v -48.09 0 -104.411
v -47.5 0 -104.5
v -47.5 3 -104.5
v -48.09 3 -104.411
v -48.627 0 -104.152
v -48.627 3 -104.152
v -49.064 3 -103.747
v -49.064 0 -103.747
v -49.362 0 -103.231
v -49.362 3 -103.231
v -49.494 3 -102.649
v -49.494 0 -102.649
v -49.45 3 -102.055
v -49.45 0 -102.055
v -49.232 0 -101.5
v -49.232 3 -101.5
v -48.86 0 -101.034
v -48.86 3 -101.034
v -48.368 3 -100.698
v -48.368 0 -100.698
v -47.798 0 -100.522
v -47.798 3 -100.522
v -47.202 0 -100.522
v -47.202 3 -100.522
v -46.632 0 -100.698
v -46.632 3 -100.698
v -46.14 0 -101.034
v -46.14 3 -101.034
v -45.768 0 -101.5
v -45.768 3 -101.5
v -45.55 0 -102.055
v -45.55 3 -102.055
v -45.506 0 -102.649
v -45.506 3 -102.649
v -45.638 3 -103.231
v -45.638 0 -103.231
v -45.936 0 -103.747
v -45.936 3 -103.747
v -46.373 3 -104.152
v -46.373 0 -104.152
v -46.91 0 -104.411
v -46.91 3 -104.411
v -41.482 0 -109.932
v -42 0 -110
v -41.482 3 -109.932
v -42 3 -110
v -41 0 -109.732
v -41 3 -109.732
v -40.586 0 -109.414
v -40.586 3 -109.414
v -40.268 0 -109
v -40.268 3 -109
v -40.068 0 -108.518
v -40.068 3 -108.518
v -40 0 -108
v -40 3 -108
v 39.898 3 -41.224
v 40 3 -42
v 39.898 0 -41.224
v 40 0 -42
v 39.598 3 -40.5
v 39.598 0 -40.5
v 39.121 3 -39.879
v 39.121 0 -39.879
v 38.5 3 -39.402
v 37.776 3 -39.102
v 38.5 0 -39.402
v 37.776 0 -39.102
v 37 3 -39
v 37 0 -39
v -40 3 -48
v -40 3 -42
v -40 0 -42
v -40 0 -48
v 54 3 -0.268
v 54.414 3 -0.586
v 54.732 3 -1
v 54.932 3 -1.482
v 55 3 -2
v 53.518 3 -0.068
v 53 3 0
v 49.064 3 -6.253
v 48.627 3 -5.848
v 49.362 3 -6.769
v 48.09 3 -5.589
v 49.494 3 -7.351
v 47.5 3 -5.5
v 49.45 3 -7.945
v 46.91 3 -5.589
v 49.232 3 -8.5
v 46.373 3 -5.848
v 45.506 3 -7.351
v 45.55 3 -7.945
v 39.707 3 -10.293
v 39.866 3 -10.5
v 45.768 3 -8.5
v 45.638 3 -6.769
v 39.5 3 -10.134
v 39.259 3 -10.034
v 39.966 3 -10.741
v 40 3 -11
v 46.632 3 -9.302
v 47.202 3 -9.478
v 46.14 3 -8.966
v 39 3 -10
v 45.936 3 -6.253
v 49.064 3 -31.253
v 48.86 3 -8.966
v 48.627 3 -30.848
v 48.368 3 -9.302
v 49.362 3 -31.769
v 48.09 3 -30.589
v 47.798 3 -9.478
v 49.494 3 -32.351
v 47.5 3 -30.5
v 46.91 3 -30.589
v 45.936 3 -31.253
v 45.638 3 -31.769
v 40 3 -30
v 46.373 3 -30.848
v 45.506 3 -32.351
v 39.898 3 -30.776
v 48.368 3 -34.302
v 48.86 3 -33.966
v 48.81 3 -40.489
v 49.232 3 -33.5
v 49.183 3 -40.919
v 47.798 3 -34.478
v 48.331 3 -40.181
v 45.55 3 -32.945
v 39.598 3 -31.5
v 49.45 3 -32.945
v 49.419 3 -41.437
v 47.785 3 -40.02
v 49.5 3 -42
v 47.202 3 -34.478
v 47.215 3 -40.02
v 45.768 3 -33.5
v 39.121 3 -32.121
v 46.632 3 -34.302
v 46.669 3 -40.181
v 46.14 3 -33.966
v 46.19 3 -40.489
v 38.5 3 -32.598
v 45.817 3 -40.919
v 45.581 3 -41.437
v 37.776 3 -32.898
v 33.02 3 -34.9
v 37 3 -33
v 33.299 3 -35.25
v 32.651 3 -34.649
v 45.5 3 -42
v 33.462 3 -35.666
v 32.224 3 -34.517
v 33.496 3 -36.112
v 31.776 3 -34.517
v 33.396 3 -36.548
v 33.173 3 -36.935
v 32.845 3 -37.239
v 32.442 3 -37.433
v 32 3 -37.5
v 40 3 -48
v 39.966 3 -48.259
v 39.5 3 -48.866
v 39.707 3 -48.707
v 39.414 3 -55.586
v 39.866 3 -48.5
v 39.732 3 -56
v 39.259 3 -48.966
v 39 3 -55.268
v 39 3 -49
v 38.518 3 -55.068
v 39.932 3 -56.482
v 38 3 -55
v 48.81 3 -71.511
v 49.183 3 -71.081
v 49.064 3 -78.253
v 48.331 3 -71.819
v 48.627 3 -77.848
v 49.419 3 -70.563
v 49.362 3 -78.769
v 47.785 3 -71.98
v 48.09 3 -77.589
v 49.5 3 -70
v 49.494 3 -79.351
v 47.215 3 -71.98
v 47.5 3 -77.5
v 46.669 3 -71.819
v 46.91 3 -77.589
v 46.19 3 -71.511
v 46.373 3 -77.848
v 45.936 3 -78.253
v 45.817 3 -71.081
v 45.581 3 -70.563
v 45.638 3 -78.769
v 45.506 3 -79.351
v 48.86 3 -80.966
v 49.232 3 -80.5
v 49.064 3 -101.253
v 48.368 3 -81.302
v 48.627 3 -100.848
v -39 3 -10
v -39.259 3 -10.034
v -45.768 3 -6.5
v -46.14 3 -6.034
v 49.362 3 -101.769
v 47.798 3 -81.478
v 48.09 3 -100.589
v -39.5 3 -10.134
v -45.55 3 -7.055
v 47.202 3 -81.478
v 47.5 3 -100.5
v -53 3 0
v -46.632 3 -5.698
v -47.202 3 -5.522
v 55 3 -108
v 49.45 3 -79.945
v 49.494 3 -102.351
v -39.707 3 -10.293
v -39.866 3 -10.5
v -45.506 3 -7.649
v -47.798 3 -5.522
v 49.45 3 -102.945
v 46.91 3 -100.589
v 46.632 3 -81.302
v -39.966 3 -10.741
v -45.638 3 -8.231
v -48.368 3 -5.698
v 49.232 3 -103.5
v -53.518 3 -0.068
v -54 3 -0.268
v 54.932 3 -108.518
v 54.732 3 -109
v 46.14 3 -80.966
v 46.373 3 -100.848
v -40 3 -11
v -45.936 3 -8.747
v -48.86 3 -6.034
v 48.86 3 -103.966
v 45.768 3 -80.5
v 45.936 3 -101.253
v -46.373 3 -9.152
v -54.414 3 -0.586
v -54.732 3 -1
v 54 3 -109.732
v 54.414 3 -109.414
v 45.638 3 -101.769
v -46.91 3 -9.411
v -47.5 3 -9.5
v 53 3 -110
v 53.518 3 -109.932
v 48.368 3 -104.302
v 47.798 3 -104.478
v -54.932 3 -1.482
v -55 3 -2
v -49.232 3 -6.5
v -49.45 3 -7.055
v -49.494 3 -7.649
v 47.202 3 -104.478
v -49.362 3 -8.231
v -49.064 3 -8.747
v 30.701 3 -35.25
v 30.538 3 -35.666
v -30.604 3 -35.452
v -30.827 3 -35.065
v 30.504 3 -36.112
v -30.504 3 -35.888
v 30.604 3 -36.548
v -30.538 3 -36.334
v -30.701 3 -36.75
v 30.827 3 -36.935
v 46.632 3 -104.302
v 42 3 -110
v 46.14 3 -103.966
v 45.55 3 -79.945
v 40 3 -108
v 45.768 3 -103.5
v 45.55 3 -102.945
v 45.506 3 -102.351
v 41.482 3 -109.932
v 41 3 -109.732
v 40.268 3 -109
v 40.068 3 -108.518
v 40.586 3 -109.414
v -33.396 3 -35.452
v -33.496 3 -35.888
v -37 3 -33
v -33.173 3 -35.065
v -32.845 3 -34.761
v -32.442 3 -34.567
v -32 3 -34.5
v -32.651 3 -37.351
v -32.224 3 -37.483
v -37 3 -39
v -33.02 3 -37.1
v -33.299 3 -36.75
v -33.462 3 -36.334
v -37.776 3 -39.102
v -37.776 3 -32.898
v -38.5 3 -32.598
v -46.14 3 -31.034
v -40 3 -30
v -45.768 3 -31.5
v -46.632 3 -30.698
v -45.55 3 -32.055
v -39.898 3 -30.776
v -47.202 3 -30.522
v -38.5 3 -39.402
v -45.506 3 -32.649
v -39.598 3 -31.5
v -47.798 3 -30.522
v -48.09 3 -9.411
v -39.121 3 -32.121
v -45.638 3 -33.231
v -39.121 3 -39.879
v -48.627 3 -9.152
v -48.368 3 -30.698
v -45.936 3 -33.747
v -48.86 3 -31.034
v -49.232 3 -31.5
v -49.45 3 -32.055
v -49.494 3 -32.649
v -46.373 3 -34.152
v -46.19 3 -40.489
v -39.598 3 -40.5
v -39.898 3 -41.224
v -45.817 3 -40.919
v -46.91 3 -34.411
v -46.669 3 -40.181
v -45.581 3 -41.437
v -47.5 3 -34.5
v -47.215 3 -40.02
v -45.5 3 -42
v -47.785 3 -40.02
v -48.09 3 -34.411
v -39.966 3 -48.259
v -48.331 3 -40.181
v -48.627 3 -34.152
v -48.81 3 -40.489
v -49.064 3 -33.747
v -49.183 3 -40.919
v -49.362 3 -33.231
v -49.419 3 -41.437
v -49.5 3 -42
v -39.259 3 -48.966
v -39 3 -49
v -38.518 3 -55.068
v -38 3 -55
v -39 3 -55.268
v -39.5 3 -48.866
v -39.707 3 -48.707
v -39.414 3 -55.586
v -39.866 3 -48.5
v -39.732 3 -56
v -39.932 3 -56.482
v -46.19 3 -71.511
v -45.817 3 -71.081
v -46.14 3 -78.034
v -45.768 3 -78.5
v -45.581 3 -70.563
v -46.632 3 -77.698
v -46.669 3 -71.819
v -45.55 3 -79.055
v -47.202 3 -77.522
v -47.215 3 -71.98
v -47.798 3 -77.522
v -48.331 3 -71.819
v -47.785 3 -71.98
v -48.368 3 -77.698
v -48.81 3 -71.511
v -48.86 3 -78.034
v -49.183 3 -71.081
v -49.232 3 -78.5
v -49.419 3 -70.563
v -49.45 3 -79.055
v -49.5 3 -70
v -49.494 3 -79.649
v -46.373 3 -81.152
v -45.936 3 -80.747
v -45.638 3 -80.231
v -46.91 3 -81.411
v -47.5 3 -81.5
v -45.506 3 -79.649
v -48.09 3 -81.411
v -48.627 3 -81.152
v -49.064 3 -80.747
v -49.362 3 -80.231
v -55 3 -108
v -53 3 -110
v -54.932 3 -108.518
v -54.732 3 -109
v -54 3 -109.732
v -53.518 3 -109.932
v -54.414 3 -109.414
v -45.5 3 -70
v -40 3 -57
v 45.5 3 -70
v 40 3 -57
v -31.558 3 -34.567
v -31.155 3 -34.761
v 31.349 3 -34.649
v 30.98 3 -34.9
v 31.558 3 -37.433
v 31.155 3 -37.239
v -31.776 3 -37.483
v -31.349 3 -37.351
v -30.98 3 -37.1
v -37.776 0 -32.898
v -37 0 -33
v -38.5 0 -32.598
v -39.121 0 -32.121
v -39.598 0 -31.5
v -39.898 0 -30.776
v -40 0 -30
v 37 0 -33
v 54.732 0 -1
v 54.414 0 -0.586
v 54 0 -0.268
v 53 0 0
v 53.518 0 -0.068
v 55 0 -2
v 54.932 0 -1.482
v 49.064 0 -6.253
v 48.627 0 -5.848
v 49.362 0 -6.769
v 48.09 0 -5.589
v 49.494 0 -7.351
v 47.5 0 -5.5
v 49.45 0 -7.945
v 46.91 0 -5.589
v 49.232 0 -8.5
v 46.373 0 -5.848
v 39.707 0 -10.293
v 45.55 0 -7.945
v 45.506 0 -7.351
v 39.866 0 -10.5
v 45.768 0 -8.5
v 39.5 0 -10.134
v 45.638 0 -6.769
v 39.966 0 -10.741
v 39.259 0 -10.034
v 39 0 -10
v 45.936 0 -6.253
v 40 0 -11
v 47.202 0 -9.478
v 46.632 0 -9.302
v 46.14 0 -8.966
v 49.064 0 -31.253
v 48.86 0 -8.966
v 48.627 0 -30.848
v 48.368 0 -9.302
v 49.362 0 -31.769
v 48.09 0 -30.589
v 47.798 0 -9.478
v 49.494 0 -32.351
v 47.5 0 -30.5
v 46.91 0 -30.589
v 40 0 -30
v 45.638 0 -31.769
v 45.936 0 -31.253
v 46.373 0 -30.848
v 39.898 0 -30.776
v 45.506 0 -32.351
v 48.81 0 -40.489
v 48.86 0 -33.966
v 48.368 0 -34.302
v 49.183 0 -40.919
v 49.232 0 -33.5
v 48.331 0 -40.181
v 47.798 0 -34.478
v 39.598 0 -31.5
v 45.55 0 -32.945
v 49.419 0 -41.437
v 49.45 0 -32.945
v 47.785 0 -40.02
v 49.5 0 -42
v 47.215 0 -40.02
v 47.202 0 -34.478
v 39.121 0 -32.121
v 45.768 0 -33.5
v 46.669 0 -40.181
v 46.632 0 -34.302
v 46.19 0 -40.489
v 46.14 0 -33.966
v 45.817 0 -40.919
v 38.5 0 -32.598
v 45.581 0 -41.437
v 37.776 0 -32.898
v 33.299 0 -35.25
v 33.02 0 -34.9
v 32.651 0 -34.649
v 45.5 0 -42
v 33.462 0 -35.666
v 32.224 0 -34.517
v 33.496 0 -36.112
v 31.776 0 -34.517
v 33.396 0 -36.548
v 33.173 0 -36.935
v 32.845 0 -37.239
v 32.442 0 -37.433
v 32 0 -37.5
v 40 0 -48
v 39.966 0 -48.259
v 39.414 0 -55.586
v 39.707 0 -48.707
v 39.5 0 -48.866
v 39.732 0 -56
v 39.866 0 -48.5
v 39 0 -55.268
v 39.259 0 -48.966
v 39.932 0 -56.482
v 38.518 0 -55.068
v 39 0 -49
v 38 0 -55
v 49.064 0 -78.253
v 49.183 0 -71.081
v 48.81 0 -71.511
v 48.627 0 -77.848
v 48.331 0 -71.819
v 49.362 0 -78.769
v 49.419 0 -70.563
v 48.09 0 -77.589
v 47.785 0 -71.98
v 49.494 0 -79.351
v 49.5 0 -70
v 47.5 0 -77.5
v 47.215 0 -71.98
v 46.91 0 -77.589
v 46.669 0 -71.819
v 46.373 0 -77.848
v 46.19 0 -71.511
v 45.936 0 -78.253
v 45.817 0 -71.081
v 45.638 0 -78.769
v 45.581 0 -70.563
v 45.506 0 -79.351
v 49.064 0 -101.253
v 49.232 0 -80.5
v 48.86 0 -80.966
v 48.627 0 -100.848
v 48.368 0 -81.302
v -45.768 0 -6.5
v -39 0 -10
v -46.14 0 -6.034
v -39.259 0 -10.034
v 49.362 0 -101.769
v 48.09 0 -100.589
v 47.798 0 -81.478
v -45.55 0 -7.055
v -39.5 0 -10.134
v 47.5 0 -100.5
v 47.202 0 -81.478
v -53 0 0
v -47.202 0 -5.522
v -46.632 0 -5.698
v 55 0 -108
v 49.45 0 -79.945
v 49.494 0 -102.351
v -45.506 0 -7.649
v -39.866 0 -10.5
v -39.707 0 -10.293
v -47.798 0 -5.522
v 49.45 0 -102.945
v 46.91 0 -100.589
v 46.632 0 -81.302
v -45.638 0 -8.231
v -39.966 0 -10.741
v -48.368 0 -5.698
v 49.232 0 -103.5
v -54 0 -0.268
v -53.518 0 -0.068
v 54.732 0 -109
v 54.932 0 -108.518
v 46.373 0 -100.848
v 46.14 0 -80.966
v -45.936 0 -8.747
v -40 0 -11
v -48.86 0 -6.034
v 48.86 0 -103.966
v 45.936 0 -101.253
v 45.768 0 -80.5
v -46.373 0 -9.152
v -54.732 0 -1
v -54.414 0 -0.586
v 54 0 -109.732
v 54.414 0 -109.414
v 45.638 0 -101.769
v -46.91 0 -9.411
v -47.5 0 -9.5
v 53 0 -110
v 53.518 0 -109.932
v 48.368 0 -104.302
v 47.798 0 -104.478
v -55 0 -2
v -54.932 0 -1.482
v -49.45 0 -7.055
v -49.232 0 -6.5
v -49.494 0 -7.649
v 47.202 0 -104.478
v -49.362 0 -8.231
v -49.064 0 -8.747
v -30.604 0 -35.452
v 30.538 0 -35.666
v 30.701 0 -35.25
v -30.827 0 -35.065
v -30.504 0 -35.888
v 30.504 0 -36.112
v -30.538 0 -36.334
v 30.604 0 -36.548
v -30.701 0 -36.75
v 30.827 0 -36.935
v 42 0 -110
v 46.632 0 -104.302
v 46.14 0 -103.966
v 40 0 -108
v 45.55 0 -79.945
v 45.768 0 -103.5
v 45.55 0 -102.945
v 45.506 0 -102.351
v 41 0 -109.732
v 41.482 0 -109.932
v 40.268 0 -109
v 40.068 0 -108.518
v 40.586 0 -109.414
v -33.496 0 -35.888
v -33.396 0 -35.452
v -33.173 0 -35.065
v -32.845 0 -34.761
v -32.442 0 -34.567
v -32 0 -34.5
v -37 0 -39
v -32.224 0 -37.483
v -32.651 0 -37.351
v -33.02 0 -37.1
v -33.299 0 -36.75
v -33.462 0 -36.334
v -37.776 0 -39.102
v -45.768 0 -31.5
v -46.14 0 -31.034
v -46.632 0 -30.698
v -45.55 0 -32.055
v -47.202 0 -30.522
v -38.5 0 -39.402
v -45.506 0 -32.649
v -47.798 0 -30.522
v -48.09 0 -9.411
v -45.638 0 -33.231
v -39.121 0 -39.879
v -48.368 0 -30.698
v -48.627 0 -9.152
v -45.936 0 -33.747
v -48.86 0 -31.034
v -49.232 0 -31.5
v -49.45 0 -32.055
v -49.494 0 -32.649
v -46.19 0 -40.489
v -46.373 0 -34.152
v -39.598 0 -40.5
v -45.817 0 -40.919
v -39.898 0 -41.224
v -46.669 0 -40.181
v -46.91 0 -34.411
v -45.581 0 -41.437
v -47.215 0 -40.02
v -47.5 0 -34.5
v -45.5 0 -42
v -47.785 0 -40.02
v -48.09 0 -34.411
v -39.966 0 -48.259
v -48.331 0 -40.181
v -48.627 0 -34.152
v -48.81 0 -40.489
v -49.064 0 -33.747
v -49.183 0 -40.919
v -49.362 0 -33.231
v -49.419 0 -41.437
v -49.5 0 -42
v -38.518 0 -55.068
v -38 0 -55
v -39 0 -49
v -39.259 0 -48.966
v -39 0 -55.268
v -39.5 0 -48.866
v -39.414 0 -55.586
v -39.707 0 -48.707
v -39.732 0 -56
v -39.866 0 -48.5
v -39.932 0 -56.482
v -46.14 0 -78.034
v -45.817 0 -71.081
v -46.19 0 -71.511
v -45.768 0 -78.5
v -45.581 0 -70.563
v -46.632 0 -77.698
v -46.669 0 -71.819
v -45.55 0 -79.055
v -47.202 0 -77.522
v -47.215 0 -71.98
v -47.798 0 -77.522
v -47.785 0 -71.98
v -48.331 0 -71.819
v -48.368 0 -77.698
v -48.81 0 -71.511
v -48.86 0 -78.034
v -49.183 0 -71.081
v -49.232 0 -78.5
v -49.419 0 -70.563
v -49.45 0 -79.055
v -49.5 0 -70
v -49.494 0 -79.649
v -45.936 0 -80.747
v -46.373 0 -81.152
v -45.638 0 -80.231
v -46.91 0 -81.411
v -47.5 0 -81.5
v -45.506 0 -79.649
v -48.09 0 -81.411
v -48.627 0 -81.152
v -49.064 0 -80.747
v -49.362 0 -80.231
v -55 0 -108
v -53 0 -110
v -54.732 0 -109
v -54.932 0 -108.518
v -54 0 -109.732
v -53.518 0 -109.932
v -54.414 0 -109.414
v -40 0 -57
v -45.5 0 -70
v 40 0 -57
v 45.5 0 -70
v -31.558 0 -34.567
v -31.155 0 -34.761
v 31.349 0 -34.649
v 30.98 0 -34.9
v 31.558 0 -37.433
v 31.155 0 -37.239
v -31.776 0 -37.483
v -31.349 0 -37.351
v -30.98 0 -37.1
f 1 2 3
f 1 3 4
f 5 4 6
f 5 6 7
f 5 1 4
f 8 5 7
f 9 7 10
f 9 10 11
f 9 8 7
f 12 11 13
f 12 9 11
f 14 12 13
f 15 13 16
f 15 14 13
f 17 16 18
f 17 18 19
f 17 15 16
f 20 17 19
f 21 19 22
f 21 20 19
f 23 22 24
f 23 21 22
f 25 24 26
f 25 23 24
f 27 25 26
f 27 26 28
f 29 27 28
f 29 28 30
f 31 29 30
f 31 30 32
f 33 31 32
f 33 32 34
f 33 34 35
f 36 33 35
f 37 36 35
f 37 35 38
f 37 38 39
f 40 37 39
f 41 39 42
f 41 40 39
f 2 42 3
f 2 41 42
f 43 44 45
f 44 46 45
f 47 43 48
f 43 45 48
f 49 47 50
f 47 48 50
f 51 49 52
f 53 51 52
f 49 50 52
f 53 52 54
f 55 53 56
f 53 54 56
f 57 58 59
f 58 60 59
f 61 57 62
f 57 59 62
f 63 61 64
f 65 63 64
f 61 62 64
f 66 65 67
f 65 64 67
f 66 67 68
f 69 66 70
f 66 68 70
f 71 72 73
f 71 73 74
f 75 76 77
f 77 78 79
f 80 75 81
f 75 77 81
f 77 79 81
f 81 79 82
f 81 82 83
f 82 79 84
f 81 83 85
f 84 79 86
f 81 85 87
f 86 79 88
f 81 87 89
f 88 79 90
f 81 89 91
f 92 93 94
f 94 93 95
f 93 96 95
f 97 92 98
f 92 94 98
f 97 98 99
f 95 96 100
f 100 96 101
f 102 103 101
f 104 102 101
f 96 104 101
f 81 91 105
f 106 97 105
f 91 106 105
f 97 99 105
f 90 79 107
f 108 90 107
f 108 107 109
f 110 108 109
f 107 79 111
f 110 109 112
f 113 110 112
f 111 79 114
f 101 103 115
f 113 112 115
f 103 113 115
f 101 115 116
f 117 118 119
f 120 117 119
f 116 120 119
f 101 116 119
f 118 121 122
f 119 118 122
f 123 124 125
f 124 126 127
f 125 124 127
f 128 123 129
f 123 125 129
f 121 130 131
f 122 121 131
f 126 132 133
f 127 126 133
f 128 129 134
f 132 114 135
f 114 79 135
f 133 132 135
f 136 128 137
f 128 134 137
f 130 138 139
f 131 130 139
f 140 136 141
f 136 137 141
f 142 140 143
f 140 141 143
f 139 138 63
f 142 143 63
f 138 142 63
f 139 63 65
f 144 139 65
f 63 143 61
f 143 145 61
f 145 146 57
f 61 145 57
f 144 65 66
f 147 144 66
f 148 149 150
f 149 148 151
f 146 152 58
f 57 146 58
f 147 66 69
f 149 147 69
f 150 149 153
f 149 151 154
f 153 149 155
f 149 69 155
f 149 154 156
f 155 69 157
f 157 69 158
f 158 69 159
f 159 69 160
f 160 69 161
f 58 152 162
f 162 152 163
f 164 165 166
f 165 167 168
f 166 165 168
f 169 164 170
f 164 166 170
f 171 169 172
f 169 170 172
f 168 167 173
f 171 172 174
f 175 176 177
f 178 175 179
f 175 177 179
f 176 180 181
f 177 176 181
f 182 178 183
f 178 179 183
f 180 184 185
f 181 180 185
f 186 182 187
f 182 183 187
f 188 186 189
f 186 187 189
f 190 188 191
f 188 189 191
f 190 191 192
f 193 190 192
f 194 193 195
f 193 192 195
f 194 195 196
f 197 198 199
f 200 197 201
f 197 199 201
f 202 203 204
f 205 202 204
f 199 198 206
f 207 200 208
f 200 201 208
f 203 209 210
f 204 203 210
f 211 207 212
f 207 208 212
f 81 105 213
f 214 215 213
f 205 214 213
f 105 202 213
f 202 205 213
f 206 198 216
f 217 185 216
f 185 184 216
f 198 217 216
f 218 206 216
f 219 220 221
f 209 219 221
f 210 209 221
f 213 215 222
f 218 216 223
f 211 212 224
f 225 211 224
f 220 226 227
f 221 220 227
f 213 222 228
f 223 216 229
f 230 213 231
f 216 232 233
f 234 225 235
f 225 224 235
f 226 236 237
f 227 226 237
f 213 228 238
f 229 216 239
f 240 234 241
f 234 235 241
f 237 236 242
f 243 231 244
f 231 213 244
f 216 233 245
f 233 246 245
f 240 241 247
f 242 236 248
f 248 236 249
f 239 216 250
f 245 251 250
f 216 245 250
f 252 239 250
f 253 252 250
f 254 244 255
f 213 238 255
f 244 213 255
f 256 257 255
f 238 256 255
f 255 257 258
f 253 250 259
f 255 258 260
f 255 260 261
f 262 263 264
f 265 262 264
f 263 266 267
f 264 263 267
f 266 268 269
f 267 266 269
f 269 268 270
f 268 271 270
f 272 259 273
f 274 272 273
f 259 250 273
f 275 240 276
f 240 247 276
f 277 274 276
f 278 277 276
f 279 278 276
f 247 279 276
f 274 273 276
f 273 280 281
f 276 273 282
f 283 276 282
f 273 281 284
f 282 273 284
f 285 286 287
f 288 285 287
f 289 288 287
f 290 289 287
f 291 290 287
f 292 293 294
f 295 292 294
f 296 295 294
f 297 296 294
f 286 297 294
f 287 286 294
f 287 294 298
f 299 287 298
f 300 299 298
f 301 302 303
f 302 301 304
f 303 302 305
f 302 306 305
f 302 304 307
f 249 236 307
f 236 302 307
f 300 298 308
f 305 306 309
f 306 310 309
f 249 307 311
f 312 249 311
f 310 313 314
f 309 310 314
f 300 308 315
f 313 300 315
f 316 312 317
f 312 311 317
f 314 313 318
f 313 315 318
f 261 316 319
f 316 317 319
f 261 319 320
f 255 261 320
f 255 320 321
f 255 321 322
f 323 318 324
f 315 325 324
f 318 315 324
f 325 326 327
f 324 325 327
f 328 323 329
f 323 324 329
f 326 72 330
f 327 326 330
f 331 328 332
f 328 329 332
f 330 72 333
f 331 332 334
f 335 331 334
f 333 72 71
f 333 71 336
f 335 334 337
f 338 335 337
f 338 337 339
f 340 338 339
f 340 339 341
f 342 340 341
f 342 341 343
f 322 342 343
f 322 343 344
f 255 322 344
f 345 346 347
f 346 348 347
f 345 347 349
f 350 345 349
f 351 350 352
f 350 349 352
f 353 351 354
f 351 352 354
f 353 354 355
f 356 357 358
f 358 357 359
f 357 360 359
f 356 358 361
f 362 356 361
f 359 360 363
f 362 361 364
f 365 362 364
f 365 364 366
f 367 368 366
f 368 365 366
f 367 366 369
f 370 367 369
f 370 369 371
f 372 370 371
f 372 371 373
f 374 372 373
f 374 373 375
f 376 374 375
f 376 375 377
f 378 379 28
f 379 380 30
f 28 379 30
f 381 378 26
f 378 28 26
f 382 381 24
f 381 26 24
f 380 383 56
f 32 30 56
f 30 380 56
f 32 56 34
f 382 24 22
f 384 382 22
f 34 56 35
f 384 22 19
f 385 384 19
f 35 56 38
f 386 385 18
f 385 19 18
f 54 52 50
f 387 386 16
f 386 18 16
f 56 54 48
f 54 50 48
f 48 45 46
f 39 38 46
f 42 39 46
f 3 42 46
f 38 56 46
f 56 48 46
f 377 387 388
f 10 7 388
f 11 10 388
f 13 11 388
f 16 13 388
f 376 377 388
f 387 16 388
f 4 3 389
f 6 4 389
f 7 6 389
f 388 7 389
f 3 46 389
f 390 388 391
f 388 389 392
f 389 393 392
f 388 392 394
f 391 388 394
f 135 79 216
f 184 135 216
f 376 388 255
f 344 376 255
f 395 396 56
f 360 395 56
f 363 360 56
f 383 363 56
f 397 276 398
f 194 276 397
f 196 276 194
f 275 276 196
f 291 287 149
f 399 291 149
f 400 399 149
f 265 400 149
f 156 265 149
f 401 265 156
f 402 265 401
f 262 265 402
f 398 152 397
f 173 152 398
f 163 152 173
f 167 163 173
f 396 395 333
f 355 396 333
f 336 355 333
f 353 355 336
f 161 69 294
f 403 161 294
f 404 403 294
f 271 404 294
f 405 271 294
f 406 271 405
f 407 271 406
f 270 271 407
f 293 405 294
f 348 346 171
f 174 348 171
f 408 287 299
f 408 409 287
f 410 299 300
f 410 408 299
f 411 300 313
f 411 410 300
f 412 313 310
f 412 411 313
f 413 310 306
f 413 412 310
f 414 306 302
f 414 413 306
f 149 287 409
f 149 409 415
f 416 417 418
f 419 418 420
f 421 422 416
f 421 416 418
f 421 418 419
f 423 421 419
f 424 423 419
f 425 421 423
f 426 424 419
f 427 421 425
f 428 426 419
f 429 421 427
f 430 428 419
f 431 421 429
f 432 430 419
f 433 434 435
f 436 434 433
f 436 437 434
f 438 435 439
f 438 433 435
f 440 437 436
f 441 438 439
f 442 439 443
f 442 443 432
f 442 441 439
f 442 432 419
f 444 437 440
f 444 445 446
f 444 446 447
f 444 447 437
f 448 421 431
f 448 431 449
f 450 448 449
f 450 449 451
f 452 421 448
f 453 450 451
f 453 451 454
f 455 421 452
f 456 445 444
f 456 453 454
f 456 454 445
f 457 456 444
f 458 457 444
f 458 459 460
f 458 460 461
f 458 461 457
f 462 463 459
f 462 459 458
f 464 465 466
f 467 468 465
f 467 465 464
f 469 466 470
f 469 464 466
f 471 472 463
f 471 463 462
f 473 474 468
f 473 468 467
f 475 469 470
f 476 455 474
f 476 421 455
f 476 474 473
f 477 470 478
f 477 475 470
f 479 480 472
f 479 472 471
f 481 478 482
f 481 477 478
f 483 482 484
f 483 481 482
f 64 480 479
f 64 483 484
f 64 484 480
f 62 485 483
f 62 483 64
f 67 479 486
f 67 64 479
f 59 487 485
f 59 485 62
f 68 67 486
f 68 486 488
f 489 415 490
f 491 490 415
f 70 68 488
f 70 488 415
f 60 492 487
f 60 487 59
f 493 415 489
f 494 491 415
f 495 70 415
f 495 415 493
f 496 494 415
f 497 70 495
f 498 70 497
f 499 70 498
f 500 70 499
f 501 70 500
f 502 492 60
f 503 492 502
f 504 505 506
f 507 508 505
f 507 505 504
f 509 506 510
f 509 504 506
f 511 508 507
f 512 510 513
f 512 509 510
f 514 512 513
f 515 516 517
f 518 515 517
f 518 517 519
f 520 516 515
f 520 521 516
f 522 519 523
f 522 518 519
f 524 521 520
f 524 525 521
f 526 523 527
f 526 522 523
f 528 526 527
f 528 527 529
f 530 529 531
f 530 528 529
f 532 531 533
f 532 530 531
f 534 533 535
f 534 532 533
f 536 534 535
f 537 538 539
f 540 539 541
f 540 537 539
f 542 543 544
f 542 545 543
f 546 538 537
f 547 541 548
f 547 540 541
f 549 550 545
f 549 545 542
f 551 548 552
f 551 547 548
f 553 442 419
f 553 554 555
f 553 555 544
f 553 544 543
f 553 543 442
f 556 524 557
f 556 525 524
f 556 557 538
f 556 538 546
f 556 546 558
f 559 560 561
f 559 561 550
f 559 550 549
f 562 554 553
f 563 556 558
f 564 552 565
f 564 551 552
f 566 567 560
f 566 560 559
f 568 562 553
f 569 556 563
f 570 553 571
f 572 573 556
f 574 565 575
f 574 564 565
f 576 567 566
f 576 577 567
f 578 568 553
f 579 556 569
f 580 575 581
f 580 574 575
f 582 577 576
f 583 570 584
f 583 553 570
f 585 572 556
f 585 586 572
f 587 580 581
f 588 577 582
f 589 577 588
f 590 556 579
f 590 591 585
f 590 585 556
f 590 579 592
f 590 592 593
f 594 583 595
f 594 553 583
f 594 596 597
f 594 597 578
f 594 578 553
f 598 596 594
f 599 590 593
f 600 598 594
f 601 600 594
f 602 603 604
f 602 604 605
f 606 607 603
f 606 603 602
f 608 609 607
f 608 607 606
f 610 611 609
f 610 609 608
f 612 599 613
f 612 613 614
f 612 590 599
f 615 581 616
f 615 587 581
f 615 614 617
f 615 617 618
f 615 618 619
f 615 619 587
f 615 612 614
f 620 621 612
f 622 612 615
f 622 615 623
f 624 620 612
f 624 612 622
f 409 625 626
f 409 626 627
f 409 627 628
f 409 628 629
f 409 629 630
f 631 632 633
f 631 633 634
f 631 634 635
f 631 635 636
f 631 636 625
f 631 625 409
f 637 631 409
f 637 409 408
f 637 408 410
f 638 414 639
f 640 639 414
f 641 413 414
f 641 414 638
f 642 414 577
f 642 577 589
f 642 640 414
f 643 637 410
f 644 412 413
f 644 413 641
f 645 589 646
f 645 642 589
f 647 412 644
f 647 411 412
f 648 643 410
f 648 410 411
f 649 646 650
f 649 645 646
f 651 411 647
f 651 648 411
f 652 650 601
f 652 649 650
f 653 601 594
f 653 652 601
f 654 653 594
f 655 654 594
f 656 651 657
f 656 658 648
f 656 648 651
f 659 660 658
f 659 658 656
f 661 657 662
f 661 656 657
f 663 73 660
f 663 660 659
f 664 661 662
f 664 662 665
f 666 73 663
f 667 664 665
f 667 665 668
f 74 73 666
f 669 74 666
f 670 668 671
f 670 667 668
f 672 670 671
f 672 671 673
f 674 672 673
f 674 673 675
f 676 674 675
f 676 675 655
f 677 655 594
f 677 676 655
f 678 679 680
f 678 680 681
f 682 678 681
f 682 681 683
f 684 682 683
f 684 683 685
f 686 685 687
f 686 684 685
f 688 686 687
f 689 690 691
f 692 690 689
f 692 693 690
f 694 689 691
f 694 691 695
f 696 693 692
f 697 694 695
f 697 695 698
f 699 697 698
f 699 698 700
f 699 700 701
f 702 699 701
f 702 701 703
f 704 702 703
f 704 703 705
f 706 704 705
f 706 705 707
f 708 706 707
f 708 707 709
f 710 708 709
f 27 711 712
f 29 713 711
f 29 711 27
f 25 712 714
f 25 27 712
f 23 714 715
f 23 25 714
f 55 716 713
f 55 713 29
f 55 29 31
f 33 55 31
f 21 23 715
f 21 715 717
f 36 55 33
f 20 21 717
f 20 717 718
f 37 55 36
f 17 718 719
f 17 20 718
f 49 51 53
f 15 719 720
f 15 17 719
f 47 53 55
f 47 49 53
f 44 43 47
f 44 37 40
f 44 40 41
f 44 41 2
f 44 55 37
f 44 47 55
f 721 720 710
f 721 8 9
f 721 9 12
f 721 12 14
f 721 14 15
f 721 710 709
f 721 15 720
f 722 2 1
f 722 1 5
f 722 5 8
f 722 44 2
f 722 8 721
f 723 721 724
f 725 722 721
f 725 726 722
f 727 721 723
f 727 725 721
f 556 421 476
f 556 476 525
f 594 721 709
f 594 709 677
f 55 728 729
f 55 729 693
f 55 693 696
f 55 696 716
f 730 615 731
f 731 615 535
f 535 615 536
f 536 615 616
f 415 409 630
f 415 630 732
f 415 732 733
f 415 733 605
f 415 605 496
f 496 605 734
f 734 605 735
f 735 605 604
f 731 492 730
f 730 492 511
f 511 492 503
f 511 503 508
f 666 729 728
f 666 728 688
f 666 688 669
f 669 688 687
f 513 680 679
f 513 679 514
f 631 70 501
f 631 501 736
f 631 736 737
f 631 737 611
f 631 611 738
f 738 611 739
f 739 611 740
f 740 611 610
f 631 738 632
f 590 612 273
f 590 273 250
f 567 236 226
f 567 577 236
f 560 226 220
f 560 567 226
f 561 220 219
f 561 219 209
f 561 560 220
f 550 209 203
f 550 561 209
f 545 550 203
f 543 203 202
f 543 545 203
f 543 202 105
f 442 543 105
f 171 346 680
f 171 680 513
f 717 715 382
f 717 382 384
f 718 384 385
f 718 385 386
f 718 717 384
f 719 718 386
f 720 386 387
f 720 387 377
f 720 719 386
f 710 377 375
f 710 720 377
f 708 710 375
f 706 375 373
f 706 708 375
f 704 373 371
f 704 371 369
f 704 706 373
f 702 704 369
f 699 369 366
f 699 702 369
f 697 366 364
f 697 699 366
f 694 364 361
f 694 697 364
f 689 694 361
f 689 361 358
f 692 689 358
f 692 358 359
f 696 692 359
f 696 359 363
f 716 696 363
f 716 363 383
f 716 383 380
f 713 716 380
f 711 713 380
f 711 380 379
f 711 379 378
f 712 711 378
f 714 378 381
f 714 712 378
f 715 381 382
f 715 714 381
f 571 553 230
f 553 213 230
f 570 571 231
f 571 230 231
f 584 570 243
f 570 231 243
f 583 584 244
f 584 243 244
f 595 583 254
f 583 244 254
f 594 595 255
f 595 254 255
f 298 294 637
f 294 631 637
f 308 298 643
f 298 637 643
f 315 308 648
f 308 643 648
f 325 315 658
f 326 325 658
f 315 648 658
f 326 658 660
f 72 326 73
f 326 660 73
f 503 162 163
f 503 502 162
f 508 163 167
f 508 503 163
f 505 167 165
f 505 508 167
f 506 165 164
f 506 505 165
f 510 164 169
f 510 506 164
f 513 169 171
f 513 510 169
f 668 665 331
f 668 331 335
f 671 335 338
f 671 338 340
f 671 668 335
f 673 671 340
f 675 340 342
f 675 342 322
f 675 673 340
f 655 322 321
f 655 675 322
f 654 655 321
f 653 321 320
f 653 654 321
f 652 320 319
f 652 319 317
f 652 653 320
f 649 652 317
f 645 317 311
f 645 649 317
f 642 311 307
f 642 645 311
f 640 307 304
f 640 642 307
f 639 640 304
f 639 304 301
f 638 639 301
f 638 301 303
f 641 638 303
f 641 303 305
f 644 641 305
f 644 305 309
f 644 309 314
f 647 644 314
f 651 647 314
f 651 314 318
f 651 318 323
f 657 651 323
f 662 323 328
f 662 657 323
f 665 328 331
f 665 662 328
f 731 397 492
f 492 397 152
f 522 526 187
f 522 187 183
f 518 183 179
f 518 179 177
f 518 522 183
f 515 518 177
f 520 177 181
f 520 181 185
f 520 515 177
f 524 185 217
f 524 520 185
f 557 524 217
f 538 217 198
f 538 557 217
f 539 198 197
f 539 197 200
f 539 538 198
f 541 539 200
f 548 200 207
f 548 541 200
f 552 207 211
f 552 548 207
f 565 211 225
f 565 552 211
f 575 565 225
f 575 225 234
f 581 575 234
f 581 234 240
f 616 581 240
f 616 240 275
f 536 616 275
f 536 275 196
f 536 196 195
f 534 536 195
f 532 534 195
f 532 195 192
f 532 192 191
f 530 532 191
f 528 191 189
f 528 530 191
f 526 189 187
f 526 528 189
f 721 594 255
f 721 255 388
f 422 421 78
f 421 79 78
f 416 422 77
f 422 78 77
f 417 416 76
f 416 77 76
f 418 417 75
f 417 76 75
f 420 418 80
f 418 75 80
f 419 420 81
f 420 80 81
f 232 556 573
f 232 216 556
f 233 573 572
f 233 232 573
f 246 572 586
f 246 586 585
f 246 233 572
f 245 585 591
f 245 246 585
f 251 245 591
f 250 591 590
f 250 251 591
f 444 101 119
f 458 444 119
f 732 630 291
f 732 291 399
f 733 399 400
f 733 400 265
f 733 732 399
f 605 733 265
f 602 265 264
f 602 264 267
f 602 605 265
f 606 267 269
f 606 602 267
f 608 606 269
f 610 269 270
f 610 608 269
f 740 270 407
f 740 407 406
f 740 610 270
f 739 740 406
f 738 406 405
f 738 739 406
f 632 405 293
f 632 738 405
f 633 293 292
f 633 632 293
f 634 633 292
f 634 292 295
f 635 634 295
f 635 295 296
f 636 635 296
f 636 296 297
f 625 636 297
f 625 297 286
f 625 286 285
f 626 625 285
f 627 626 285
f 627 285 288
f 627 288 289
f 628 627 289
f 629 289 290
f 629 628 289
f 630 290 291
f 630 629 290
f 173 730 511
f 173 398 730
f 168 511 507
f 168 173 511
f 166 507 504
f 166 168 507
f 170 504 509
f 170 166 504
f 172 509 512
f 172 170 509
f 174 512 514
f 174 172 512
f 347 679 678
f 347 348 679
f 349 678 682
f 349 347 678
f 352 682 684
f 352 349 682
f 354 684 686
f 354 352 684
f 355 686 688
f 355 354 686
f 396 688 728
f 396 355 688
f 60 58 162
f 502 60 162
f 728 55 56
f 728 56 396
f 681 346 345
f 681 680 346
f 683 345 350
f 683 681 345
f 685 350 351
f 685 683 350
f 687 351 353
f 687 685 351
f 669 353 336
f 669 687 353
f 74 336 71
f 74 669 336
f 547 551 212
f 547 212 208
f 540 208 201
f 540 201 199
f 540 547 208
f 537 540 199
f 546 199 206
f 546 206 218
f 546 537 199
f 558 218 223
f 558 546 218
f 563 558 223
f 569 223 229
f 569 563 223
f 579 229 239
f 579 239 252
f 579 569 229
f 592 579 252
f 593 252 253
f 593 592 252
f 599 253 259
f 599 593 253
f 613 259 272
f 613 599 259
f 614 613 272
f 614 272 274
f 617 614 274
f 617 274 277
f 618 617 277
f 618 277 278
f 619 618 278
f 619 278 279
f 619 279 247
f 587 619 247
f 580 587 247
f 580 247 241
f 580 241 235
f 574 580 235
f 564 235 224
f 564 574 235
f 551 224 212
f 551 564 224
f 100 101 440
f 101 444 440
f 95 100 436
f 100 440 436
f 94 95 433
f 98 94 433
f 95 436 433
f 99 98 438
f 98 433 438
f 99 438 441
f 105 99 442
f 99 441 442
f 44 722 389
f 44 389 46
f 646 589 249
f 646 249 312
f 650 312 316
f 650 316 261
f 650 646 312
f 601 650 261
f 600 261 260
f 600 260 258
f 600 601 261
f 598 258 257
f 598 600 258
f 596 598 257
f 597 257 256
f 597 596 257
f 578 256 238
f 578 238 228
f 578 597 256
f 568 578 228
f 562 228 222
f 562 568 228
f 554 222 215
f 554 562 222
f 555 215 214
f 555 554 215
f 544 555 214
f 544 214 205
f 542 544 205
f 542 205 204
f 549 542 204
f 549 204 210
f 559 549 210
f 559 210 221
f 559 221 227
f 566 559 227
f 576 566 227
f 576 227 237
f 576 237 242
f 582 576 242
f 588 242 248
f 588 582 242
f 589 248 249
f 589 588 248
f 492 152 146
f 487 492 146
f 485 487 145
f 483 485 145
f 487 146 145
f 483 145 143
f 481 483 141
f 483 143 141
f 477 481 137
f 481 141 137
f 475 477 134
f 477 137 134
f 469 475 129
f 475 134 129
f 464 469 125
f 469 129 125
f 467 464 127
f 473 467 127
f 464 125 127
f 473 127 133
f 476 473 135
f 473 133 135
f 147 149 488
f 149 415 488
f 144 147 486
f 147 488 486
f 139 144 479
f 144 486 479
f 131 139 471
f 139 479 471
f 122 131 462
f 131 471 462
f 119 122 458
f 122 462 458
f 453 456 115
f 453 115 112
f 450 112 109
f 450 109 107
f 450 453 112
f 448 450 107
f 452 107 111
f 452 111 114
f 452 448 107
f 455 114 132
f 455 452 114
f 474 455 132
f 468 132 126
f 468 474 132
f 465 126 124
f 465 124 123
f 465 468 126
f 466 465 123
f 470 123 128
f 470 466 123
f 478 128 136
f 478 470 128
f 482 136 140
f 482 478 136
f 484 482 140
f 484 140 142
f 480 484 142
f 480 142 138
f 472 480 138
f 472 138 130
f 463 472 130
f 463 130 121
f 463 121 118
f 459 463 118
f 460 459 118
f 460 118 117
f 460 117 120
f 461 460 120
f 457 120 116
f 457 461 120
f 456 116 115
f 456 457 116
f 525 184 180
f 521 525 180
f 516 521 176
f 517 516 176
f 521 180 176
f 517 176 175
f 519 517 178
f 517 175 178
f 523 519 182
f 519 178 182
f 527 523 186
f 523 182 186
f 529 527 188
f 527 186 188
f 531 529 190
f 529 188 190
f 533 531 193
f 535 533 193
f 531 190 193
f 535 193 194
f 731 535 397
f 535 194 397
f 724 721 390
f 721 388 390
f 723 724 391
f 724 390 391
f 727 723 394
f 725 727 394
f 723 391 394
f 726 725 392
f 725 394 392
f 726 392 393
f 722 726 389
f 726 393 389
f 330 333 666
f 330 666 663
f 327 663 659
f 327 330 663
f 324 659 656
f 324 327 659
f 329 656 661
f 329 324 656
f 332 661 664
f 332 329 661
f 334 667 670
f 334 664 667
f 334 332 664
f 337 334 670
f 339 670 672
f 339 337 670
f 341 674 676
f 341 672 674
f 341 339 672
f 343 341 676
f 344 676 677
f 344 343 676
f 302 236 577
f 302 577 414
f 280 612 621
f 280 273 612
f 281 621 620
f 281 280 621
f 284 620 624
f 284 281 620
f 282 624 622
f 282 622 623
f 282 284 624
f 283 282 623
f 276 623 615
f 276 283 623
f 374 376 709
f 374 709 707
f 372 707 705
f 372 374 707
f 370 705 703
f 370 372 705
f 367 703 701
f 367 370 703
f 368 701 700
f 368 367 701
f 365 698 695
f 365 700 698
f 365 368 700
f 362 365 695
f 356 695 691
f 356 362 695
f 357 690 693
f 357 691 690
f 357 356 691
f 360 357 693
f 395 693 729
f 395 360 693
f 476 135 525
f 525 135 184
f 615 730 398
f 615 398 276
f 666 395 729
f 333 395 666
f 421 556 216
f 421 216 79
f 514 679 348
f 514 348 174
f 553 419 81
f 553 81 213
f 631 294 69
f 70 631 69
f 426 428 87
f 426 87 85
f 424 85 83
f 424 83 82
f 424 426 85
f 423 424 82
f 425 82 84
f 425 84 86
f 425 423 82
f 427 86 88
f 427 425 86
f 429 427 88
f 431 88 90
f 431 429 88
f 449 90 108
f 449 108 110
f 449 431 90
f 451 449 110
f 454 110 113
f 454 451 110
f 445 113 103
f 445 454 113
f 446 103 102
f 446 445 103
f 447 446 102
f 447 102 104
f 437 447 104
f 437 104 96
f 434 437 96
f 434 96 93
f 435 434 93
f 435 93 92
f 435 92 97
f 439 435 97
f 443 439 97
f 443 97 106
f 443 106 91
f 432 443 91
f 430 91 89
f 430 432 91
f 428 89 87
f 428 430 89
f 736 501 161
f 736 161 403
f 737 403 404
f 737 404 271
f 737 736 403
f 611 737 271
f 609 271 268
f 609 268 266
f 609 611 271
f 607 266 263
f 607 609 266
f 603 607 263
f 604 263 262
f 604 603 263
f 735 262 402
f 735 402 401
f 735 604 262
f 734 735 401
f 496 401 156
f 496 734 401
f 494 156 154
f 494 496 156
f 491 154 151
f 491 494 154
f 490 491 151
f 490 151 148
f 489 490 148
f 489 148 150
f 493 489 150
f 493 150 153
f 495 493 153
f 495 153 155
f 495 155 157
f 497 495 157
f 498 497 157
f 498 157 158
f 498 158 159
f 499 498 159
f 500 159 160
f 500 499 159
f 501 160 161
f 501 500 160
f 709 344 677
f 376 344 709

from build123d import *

# Parameters (mm, degrees)
SKETCH_1_R          = 2
SKETCH_1_R_2        = 1.5
EXTRUDE_1_DEPTH     = 3
SKETCH_2_W          = 80
SKETCH_2_H          = 23
SKETCH_2_H_2        = 10
CUT_EXTRUDE_1_DEPTH = 124.020323524
FILLET_1_R          = 2
FILLET_2_R          = 3
FILLET_3_R          = 1


with BuildPart() as part:
    # 草图1 → 凸台-拉伸1 (new body)
    with BuildSketch(Plane(origin=(0, 0, 0), x_dir=(1, 0, 0), z_dir=(0, 1, 0))):
        Polygon((55, 110), (55, 0), (-55, 0), (-55, 110), (-40, 110), (-40, 55), (40, 55), (40, 110), align=None)
        with Locations(Location((47.5, 32.5, 0), (0, 0, 270))):
            Circle(SKETCH_1_R, mode=Mode.SUBTRACT)
        with Locations(Location((47.5, 7.5, 0), (0, 0, 270))):
            Circle(SKETCH_1_R, mode=Mode.SUBTRACT)
        with Locations(Location((47.5, 79.5, 0), (0, 0, 270))):
            Circle(SKETCH_1_R, mode=Mode.SUBTRACT)
        with Locations(Location((47.5, 102.5, 0), (0, 0, 270))):
            Circle(SKETCH_1_R, mode=Mode.SUBTRACT)
        with Locations(Location((-47.5, 102.5, 0), (0, 0, 90))):
            Circle(SKETCH_1_R, mode=Mode.SUBTRACT)
        with Locations(Location((-47.5, 79.5, 0), (0, 0, 90))):
            Circle(SKETCH_1_R, mode=Mode.SUBTRACT)
        with Locations(Location((-47.5, 7.5, 0), (0, 0, 90))):
            Circle(SKETCH_1_R, mode=Mode.SUBTRACT)
        with Locations(Location((-47.5, 32.5, 0), (0, 0, 90))):
            Circle(SKETCH_1_R, mode=Mode.SUBTRACT)
        with Locations(Location((-32, 36, 0), (0, 0, 270))):
            Circle(SKETCH_1_R_2, mode=Mode.SUBTRACT)
        with Locations(Location((32, 36, 0), (0, 0, 90))):
            Circle(SKETCH_1_R_2, mode=Mode.SUBTRACT)
    extrude(amount=EXTRUDE_1_DEPTH)

    # 草图2 → 切除-拉伸1 (cut, through all)
    with BuildSketch(Plane(origin=(0, 3, 0), x_dir=(1, 0, 0), z_dir=(0, 1, 0))):
        with Locations((0, 21.5)):
            Rectangle(SKETCH_2_W, SKETCH_2_H)
        with Locations((0, 44)):
            Rectangle(SKETCH_2_W, SKETCH_2_H_2)
        with BuildLine():
            Line((-45.5, 70), (-45.5, 42))
            ThreePointArc((-45.5, 42), (-47.5, 40), (-49.5, 42))
            Line((-49.5, 42), (-49.5, 70))
            ThreePointArc((-49.5, 70), (-47.5, 72), (-45.5, 70))
        make_face()
        with BuildLine():
            Line((45.5, 70), (45.5, 42))
            ThreePointArc((45.5, 42), (47.5, 40), (49.5, 42))
            Line((49.5, 42), (49.5, 70))
            ThreePointArc((49.5, 70), (47.5, 72), (45.5, 70))
        make_face()
    extrude(amount=-CUT_EXTRUDE_1_DEPTH, mode=Mode.SUBTRACT)

    # 圆角1
    fillet_1_edges = [part.edges().sort_by_distance(p)[0] for p in [
        (55, 1.5, -110),
        (55, 1.5, 0),
        (-55, 1.5, 0),
        (-55, 1.5, -110),
        (-40, 1.5, -110),
        (-40, 1.5, -55),
        (40, 1.5, -55),
        (40, 1.5, -110),
    ]]
    fillet(fillet_1_edges, radius=FILLET_1_R)

    # 圆角2
    fillet_2_edges = [part.edges().sort_by_distance(p)[0] for p in [
        (-40, 1.5, -33),
        (40, 1.5, -33),
        (40, 1.5, -39),
        (-40, 1.5, -39),
    ]]
    fillet(fillet_2_edges, radius=FILLET_2_R)

    # 圆角3
    fillet_3_edges = [part.edges().sort_by_distance(p)[0] for p in [
        (-40, 1.5, -10),
        (40, 1.5, -10),
        (-40, 1.5, -49),
        (40, 1.5, -49),
    ]]
    fillet(fillet_3_edges, radius=FILLET_3_R)


solid = part.part
